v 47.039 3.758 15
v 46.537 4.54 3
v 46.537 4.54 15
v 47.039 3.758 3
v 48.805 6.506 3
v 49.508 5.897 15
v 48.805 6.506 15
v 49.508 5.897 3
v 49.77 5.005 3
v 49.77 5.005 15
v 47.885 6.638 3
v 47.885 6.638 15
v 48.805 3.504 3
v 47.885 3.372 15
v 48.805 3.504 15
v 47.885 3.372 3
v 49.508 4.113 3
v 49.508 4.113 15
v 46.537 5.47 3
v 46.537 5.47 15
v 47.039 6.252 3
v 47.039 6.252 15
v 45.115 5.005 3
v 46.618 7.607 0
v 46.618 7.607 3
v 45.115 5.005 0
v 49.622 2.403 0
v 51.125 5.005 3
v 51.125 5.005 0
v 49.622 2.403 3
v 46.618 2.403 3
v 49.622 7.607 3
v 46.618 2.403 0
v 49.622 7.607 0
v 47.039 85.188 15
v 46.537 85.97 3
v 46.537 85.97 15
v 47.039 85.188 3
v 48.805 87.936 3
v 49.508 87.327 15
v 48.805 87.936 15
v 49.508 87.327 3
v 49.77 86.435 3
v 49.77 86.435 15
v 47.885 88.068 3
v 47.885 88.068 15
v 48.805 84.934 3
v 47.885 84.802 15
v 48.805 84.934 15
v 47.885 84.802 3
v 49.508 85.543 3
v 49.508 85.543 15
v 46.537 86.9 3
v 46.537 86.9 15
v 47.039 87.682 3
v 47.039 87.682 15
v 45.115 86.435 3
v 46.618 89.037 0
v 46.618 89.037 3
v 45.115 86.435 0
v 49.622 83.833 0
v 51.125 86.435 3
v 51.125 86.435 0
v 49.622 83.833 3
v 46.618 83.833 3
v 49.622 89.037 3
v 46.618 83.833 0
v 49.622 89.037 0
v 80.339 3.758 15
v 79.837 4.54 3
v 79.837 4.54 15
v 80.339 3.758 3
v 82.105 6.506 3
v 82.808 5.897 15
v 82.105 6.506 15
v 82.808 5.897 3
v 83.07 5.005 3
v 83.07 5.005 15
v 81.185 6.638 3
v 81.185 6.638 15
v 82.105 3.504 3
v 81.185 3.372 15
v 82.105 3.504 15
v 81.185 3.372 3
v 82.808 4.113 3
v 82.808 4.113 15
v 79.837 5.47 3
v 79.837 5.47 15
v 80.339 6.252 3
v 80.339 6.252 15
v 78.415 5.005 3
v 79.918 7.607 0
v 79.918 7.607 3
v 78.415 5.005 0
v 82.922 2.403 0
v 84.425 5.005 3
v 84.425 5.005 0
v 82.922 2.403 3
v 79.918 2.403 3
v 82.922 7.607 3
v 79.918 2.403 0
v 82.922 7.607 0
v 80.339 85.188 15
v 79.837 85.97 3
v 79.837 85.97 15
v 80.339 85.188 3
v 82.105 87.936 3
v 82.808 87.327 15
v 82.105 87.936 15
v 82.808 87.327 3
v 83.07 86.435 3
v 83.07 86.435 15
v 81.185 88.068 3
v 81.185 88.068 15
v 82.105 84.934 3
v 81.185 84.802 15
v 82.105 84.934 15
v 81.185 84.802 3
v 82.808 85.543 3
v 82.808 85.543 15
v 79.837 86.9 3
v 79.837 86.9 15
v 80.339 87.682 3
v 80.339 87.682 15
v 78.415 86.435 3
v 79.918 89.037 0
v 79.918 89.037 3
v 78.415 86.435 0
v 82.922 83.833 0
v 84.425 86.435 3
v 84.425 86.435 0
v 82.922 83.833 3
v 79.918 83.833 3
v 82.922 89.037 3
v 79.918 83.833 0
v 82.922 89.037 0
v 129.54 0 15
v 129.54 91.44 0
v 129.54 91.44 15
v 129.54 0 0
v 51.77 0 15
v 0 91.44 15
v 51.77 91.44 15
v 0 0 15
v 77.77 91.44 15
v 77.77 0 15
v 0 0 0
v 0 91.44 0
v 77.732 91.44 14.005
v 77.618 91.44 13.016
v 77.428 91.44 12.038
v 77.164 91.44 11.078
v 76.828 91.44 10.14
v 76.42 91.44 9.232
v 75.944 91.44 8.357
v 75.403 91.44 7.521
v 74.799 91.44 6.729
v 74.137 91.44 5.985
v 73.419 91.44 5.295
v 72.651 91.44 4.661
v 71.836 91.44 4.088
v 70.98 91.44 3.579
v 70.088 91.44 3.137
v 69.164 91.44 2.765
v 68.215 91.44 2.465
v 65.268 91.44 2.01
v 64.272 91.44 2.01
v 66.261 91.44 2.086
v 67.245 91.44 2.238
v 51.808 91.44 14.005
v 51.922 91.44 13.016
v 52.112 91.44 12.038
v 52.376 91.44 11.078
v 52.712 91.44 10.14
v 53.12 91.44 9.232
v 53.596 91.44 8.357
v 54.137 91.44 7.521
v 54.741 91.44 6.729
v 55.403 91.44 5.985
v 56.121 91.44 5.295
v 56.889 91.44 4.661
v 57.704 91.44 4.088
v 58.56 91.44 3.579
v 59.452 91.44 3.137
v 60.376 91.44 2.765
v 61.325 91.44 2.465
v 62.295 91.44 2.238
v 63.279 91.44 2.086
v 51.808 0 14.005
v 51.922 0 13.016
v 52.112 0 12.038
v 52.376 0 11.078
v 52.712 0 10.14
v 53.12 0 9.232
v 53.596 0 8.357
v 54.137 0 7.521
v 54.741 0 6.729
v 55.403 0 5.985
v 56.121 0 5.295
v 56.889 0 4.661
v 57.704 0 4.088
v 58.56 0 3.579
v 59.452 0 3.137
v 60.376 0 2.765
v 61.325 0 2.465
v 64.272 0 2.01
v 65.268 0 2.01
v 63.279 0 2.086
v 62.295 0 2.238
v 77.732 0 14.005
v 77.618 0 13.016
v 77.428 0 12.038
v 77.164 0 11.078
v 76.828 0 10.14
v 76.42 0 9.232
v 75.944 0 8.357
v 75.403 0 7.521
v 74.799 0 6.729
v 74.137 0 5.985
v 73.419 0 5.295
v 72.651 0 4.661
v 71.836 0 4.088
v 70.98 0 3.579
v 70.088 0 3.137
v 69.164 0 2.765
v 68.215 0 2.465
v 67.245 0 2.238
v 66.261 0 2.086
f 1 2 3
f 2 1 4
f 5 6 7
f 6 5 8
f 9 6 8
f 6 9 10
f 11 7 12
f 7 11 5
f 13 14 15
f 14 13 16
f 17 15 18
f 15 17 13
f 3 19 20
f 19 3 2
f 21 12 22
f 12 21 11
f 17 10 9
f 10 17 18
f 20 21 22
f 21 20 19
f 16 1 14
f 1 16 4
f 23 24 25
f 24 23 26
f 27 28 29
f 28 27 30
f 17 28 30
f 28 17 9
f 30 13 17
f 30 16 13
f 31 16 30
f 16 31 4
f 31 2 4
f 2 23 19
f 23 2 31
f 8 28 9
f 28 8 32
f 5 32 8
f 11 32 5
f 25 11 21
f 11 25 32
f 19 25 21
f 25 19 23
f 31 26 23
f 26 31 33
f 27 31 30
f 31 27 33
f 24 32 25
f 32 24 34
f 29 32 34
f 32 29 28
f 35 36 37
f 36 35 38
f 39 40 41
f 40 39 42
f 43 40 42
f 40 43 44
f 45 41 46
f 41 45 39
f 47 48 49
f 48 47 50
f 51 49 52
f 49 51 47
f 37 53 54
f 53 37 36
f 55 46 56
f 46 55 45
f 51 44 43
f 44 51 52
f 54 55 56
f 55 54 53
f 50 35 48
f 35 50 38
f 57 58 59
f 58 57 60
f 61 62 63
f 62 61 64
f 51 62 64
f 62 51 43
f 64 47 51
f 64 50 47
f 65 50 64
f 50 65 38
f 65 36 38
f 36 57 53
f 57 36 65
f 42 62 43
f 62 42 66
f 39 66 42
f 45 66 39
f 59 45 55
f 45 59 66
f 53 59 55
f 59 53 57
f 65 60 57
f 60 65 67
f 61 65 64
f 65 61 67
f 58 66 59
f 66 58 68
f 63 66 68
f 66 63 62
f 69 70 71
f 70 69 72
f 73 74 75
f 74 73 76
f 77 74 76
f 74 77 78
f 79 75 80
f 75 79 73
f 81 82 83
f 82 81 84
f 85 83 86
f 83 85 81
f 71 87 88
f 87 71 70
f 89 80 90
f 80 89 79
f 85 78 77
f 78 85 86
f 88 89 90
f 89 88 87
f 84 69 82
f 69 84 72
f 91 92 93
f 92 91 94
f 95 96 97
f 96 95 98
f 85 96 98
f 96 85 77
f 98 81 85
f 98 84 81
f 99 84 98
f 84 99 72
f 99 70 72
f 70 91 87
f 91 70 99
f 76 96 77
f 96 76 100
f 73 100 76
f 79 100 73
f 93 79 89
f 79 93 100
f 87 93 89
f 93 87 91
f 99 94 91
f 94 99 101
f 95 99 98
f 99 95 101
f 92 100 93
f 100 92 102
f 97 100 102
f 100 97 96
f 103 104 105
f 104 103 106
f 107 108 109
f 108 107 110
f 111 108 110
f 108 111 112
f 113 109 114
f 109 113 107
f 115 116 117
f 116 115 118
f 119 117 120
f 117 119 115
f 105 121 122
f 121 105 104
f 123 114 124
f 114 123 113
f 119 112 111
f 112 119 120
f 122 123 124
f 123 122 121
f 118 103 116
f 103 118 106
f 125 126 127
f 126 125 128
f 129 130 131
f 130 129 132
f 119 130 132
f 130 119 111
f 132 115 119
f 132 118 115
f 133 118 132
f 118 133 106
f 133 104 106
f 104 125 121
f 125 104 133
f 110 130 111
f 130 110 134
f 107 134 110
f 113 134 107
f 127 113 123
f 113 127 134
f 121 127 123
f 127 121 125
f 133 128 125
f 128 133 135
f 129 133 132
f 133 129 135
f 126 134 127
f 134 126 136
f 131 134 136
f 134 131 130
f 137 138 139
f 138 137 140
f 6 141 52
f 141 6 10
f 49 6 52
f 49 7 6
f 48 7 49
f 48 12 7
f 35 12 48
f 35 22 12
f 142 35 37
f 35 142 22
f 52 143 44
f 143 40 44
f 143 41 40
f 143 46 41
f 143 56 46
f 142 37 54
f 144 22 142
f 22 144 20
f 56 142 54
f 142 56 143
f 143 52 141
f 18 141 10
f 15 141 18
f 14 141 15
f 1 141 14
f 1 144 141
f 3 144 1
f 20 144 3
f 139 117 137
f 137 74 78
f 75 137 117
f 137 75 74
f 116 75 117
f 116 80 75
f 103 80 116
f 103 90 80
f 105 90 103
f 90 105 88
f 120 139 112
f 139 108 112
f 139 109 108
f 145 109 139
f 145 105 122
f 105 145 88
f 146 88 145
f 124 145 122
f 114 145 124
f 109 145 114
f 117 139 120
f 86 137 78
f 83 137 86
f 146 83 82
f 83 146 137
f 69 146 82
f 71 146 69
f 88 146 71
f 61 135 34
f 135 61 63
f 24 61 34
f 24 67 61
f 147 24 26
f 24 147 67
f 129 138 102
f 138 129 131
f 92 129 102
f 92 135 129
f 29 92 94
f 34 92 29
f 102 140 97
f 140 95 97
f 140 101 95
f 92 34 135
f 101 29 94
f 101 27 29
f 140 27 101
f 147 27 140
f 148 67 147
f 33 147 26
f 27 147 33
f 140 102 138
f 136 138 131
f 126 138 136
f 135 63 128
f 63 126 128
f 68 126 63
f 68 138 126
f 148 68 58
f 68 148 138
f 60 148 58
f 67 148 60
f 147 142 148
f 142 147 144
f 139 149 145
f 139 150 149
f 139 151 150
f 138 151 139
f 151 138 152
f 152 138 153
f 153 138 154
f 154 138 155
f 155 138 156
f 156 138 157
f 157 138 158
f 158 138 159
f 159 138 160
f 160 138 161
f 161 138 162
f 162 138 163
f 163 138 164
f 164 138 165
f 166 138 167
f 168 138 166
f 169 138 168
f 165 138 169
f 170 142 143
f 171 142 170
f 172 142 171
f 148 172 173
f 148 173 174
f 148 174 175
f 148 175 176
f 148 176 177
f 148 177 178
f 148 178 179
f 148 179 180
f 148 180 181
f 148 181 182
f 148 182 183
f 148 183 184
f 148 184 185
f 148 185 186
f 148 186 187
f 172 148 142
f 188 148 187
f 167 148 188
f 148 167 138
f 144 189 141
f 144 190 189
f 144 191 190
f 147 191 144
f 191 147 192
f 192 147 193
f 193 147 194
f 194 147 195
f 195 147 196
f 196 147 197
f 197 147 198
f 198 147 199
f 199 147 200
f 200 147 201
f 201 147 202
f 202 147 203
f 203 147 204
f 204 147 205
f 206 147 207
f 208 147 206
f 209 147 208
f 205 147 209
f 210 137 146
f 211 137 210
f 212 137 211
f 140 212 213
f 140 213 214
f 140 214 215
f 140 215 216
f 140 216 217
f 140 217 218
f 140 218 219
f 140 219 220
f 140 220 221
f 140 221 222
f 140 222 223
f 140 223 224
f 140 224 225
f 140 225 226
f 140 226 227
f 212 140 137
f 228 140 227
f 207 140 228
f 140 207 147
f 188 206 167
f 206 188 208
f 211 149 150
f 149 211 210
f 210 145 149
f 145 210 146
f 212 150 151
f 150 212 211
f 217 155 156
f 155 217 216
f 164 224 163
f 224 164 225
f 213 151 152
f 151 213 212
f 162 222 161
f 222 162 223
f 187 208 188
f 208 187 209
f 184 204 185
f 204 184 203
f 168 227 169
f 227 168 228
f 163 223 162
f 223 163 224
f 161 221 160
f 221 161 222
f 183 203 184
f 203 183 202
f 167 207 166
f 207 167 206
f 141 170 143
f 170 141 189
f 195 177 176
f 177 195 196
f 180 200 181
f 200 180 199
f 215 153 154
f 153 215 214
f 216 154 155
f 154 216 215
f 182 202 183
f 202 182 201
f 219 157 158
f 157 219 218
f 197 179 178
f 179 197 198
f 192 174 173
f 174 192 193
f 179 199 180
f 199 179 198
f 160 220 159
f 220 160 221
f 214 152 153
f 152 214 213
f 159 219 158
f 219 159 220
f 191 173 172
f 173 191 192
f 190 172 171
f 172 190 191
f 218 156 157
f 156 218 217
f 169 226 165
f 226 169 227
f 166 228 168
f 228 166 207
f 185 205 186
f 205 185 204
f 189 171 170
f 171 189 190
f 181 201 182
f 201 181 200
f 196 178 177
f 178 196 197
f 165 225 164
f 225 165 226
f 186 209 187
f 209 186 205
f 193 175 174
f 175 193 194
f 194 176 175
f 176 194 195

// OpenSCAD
$fa = 1;
$fs = 1;

mm = 1;
inch = 25.4 * mm;

pole_dia = 26 * mm;
min_thickness = 2 * mm;

// For M3
screw_dia = 3.3 * mm;
nut_dia = 6.01 * mm;
nut_height = 3 * mm;

sign_size = [5.1, 3.6] * inch;

total_thickness = pole_dia / 2 + min_thickness;
screw_x_pitch = pole_dia + 2 * min_thickness + screw_dia;
screw_y_pitch = sign_size[1] - 2 * min_thickness - nut_dia;

module sign_clamp()
{
    difference()
    {
        cube([sign_size[0], sign_size[1], total_thickness]);

        translate([sign_size[0] / 2, -0.1, total_thickness])
            rotate([-90, 0, 0])
                cylinder(d=pole_dia, h=sign_size[1] + 0.2);

        for (dx = [-0.5, 0.5])
        {
            for (dy = [-0.5, 0.5])
            {
                translate([sign_size[0] / 2 + dx * screw_x_pitch, sign_size[1] / 2 + dy * screw_y_pitch, -0.1])
                {
                    cylinder(d=screw_dia, h=total_thickness + 0.2);
                    linear_extrude(height=nut_height + 0.1)
                    polygon([
                        for (a = [0:5]) nut_dia / 2 * [cos(a * 60), sin(a * 60)]
                    ]);
                }
            }
        }
    }
}

sign_clamp();
